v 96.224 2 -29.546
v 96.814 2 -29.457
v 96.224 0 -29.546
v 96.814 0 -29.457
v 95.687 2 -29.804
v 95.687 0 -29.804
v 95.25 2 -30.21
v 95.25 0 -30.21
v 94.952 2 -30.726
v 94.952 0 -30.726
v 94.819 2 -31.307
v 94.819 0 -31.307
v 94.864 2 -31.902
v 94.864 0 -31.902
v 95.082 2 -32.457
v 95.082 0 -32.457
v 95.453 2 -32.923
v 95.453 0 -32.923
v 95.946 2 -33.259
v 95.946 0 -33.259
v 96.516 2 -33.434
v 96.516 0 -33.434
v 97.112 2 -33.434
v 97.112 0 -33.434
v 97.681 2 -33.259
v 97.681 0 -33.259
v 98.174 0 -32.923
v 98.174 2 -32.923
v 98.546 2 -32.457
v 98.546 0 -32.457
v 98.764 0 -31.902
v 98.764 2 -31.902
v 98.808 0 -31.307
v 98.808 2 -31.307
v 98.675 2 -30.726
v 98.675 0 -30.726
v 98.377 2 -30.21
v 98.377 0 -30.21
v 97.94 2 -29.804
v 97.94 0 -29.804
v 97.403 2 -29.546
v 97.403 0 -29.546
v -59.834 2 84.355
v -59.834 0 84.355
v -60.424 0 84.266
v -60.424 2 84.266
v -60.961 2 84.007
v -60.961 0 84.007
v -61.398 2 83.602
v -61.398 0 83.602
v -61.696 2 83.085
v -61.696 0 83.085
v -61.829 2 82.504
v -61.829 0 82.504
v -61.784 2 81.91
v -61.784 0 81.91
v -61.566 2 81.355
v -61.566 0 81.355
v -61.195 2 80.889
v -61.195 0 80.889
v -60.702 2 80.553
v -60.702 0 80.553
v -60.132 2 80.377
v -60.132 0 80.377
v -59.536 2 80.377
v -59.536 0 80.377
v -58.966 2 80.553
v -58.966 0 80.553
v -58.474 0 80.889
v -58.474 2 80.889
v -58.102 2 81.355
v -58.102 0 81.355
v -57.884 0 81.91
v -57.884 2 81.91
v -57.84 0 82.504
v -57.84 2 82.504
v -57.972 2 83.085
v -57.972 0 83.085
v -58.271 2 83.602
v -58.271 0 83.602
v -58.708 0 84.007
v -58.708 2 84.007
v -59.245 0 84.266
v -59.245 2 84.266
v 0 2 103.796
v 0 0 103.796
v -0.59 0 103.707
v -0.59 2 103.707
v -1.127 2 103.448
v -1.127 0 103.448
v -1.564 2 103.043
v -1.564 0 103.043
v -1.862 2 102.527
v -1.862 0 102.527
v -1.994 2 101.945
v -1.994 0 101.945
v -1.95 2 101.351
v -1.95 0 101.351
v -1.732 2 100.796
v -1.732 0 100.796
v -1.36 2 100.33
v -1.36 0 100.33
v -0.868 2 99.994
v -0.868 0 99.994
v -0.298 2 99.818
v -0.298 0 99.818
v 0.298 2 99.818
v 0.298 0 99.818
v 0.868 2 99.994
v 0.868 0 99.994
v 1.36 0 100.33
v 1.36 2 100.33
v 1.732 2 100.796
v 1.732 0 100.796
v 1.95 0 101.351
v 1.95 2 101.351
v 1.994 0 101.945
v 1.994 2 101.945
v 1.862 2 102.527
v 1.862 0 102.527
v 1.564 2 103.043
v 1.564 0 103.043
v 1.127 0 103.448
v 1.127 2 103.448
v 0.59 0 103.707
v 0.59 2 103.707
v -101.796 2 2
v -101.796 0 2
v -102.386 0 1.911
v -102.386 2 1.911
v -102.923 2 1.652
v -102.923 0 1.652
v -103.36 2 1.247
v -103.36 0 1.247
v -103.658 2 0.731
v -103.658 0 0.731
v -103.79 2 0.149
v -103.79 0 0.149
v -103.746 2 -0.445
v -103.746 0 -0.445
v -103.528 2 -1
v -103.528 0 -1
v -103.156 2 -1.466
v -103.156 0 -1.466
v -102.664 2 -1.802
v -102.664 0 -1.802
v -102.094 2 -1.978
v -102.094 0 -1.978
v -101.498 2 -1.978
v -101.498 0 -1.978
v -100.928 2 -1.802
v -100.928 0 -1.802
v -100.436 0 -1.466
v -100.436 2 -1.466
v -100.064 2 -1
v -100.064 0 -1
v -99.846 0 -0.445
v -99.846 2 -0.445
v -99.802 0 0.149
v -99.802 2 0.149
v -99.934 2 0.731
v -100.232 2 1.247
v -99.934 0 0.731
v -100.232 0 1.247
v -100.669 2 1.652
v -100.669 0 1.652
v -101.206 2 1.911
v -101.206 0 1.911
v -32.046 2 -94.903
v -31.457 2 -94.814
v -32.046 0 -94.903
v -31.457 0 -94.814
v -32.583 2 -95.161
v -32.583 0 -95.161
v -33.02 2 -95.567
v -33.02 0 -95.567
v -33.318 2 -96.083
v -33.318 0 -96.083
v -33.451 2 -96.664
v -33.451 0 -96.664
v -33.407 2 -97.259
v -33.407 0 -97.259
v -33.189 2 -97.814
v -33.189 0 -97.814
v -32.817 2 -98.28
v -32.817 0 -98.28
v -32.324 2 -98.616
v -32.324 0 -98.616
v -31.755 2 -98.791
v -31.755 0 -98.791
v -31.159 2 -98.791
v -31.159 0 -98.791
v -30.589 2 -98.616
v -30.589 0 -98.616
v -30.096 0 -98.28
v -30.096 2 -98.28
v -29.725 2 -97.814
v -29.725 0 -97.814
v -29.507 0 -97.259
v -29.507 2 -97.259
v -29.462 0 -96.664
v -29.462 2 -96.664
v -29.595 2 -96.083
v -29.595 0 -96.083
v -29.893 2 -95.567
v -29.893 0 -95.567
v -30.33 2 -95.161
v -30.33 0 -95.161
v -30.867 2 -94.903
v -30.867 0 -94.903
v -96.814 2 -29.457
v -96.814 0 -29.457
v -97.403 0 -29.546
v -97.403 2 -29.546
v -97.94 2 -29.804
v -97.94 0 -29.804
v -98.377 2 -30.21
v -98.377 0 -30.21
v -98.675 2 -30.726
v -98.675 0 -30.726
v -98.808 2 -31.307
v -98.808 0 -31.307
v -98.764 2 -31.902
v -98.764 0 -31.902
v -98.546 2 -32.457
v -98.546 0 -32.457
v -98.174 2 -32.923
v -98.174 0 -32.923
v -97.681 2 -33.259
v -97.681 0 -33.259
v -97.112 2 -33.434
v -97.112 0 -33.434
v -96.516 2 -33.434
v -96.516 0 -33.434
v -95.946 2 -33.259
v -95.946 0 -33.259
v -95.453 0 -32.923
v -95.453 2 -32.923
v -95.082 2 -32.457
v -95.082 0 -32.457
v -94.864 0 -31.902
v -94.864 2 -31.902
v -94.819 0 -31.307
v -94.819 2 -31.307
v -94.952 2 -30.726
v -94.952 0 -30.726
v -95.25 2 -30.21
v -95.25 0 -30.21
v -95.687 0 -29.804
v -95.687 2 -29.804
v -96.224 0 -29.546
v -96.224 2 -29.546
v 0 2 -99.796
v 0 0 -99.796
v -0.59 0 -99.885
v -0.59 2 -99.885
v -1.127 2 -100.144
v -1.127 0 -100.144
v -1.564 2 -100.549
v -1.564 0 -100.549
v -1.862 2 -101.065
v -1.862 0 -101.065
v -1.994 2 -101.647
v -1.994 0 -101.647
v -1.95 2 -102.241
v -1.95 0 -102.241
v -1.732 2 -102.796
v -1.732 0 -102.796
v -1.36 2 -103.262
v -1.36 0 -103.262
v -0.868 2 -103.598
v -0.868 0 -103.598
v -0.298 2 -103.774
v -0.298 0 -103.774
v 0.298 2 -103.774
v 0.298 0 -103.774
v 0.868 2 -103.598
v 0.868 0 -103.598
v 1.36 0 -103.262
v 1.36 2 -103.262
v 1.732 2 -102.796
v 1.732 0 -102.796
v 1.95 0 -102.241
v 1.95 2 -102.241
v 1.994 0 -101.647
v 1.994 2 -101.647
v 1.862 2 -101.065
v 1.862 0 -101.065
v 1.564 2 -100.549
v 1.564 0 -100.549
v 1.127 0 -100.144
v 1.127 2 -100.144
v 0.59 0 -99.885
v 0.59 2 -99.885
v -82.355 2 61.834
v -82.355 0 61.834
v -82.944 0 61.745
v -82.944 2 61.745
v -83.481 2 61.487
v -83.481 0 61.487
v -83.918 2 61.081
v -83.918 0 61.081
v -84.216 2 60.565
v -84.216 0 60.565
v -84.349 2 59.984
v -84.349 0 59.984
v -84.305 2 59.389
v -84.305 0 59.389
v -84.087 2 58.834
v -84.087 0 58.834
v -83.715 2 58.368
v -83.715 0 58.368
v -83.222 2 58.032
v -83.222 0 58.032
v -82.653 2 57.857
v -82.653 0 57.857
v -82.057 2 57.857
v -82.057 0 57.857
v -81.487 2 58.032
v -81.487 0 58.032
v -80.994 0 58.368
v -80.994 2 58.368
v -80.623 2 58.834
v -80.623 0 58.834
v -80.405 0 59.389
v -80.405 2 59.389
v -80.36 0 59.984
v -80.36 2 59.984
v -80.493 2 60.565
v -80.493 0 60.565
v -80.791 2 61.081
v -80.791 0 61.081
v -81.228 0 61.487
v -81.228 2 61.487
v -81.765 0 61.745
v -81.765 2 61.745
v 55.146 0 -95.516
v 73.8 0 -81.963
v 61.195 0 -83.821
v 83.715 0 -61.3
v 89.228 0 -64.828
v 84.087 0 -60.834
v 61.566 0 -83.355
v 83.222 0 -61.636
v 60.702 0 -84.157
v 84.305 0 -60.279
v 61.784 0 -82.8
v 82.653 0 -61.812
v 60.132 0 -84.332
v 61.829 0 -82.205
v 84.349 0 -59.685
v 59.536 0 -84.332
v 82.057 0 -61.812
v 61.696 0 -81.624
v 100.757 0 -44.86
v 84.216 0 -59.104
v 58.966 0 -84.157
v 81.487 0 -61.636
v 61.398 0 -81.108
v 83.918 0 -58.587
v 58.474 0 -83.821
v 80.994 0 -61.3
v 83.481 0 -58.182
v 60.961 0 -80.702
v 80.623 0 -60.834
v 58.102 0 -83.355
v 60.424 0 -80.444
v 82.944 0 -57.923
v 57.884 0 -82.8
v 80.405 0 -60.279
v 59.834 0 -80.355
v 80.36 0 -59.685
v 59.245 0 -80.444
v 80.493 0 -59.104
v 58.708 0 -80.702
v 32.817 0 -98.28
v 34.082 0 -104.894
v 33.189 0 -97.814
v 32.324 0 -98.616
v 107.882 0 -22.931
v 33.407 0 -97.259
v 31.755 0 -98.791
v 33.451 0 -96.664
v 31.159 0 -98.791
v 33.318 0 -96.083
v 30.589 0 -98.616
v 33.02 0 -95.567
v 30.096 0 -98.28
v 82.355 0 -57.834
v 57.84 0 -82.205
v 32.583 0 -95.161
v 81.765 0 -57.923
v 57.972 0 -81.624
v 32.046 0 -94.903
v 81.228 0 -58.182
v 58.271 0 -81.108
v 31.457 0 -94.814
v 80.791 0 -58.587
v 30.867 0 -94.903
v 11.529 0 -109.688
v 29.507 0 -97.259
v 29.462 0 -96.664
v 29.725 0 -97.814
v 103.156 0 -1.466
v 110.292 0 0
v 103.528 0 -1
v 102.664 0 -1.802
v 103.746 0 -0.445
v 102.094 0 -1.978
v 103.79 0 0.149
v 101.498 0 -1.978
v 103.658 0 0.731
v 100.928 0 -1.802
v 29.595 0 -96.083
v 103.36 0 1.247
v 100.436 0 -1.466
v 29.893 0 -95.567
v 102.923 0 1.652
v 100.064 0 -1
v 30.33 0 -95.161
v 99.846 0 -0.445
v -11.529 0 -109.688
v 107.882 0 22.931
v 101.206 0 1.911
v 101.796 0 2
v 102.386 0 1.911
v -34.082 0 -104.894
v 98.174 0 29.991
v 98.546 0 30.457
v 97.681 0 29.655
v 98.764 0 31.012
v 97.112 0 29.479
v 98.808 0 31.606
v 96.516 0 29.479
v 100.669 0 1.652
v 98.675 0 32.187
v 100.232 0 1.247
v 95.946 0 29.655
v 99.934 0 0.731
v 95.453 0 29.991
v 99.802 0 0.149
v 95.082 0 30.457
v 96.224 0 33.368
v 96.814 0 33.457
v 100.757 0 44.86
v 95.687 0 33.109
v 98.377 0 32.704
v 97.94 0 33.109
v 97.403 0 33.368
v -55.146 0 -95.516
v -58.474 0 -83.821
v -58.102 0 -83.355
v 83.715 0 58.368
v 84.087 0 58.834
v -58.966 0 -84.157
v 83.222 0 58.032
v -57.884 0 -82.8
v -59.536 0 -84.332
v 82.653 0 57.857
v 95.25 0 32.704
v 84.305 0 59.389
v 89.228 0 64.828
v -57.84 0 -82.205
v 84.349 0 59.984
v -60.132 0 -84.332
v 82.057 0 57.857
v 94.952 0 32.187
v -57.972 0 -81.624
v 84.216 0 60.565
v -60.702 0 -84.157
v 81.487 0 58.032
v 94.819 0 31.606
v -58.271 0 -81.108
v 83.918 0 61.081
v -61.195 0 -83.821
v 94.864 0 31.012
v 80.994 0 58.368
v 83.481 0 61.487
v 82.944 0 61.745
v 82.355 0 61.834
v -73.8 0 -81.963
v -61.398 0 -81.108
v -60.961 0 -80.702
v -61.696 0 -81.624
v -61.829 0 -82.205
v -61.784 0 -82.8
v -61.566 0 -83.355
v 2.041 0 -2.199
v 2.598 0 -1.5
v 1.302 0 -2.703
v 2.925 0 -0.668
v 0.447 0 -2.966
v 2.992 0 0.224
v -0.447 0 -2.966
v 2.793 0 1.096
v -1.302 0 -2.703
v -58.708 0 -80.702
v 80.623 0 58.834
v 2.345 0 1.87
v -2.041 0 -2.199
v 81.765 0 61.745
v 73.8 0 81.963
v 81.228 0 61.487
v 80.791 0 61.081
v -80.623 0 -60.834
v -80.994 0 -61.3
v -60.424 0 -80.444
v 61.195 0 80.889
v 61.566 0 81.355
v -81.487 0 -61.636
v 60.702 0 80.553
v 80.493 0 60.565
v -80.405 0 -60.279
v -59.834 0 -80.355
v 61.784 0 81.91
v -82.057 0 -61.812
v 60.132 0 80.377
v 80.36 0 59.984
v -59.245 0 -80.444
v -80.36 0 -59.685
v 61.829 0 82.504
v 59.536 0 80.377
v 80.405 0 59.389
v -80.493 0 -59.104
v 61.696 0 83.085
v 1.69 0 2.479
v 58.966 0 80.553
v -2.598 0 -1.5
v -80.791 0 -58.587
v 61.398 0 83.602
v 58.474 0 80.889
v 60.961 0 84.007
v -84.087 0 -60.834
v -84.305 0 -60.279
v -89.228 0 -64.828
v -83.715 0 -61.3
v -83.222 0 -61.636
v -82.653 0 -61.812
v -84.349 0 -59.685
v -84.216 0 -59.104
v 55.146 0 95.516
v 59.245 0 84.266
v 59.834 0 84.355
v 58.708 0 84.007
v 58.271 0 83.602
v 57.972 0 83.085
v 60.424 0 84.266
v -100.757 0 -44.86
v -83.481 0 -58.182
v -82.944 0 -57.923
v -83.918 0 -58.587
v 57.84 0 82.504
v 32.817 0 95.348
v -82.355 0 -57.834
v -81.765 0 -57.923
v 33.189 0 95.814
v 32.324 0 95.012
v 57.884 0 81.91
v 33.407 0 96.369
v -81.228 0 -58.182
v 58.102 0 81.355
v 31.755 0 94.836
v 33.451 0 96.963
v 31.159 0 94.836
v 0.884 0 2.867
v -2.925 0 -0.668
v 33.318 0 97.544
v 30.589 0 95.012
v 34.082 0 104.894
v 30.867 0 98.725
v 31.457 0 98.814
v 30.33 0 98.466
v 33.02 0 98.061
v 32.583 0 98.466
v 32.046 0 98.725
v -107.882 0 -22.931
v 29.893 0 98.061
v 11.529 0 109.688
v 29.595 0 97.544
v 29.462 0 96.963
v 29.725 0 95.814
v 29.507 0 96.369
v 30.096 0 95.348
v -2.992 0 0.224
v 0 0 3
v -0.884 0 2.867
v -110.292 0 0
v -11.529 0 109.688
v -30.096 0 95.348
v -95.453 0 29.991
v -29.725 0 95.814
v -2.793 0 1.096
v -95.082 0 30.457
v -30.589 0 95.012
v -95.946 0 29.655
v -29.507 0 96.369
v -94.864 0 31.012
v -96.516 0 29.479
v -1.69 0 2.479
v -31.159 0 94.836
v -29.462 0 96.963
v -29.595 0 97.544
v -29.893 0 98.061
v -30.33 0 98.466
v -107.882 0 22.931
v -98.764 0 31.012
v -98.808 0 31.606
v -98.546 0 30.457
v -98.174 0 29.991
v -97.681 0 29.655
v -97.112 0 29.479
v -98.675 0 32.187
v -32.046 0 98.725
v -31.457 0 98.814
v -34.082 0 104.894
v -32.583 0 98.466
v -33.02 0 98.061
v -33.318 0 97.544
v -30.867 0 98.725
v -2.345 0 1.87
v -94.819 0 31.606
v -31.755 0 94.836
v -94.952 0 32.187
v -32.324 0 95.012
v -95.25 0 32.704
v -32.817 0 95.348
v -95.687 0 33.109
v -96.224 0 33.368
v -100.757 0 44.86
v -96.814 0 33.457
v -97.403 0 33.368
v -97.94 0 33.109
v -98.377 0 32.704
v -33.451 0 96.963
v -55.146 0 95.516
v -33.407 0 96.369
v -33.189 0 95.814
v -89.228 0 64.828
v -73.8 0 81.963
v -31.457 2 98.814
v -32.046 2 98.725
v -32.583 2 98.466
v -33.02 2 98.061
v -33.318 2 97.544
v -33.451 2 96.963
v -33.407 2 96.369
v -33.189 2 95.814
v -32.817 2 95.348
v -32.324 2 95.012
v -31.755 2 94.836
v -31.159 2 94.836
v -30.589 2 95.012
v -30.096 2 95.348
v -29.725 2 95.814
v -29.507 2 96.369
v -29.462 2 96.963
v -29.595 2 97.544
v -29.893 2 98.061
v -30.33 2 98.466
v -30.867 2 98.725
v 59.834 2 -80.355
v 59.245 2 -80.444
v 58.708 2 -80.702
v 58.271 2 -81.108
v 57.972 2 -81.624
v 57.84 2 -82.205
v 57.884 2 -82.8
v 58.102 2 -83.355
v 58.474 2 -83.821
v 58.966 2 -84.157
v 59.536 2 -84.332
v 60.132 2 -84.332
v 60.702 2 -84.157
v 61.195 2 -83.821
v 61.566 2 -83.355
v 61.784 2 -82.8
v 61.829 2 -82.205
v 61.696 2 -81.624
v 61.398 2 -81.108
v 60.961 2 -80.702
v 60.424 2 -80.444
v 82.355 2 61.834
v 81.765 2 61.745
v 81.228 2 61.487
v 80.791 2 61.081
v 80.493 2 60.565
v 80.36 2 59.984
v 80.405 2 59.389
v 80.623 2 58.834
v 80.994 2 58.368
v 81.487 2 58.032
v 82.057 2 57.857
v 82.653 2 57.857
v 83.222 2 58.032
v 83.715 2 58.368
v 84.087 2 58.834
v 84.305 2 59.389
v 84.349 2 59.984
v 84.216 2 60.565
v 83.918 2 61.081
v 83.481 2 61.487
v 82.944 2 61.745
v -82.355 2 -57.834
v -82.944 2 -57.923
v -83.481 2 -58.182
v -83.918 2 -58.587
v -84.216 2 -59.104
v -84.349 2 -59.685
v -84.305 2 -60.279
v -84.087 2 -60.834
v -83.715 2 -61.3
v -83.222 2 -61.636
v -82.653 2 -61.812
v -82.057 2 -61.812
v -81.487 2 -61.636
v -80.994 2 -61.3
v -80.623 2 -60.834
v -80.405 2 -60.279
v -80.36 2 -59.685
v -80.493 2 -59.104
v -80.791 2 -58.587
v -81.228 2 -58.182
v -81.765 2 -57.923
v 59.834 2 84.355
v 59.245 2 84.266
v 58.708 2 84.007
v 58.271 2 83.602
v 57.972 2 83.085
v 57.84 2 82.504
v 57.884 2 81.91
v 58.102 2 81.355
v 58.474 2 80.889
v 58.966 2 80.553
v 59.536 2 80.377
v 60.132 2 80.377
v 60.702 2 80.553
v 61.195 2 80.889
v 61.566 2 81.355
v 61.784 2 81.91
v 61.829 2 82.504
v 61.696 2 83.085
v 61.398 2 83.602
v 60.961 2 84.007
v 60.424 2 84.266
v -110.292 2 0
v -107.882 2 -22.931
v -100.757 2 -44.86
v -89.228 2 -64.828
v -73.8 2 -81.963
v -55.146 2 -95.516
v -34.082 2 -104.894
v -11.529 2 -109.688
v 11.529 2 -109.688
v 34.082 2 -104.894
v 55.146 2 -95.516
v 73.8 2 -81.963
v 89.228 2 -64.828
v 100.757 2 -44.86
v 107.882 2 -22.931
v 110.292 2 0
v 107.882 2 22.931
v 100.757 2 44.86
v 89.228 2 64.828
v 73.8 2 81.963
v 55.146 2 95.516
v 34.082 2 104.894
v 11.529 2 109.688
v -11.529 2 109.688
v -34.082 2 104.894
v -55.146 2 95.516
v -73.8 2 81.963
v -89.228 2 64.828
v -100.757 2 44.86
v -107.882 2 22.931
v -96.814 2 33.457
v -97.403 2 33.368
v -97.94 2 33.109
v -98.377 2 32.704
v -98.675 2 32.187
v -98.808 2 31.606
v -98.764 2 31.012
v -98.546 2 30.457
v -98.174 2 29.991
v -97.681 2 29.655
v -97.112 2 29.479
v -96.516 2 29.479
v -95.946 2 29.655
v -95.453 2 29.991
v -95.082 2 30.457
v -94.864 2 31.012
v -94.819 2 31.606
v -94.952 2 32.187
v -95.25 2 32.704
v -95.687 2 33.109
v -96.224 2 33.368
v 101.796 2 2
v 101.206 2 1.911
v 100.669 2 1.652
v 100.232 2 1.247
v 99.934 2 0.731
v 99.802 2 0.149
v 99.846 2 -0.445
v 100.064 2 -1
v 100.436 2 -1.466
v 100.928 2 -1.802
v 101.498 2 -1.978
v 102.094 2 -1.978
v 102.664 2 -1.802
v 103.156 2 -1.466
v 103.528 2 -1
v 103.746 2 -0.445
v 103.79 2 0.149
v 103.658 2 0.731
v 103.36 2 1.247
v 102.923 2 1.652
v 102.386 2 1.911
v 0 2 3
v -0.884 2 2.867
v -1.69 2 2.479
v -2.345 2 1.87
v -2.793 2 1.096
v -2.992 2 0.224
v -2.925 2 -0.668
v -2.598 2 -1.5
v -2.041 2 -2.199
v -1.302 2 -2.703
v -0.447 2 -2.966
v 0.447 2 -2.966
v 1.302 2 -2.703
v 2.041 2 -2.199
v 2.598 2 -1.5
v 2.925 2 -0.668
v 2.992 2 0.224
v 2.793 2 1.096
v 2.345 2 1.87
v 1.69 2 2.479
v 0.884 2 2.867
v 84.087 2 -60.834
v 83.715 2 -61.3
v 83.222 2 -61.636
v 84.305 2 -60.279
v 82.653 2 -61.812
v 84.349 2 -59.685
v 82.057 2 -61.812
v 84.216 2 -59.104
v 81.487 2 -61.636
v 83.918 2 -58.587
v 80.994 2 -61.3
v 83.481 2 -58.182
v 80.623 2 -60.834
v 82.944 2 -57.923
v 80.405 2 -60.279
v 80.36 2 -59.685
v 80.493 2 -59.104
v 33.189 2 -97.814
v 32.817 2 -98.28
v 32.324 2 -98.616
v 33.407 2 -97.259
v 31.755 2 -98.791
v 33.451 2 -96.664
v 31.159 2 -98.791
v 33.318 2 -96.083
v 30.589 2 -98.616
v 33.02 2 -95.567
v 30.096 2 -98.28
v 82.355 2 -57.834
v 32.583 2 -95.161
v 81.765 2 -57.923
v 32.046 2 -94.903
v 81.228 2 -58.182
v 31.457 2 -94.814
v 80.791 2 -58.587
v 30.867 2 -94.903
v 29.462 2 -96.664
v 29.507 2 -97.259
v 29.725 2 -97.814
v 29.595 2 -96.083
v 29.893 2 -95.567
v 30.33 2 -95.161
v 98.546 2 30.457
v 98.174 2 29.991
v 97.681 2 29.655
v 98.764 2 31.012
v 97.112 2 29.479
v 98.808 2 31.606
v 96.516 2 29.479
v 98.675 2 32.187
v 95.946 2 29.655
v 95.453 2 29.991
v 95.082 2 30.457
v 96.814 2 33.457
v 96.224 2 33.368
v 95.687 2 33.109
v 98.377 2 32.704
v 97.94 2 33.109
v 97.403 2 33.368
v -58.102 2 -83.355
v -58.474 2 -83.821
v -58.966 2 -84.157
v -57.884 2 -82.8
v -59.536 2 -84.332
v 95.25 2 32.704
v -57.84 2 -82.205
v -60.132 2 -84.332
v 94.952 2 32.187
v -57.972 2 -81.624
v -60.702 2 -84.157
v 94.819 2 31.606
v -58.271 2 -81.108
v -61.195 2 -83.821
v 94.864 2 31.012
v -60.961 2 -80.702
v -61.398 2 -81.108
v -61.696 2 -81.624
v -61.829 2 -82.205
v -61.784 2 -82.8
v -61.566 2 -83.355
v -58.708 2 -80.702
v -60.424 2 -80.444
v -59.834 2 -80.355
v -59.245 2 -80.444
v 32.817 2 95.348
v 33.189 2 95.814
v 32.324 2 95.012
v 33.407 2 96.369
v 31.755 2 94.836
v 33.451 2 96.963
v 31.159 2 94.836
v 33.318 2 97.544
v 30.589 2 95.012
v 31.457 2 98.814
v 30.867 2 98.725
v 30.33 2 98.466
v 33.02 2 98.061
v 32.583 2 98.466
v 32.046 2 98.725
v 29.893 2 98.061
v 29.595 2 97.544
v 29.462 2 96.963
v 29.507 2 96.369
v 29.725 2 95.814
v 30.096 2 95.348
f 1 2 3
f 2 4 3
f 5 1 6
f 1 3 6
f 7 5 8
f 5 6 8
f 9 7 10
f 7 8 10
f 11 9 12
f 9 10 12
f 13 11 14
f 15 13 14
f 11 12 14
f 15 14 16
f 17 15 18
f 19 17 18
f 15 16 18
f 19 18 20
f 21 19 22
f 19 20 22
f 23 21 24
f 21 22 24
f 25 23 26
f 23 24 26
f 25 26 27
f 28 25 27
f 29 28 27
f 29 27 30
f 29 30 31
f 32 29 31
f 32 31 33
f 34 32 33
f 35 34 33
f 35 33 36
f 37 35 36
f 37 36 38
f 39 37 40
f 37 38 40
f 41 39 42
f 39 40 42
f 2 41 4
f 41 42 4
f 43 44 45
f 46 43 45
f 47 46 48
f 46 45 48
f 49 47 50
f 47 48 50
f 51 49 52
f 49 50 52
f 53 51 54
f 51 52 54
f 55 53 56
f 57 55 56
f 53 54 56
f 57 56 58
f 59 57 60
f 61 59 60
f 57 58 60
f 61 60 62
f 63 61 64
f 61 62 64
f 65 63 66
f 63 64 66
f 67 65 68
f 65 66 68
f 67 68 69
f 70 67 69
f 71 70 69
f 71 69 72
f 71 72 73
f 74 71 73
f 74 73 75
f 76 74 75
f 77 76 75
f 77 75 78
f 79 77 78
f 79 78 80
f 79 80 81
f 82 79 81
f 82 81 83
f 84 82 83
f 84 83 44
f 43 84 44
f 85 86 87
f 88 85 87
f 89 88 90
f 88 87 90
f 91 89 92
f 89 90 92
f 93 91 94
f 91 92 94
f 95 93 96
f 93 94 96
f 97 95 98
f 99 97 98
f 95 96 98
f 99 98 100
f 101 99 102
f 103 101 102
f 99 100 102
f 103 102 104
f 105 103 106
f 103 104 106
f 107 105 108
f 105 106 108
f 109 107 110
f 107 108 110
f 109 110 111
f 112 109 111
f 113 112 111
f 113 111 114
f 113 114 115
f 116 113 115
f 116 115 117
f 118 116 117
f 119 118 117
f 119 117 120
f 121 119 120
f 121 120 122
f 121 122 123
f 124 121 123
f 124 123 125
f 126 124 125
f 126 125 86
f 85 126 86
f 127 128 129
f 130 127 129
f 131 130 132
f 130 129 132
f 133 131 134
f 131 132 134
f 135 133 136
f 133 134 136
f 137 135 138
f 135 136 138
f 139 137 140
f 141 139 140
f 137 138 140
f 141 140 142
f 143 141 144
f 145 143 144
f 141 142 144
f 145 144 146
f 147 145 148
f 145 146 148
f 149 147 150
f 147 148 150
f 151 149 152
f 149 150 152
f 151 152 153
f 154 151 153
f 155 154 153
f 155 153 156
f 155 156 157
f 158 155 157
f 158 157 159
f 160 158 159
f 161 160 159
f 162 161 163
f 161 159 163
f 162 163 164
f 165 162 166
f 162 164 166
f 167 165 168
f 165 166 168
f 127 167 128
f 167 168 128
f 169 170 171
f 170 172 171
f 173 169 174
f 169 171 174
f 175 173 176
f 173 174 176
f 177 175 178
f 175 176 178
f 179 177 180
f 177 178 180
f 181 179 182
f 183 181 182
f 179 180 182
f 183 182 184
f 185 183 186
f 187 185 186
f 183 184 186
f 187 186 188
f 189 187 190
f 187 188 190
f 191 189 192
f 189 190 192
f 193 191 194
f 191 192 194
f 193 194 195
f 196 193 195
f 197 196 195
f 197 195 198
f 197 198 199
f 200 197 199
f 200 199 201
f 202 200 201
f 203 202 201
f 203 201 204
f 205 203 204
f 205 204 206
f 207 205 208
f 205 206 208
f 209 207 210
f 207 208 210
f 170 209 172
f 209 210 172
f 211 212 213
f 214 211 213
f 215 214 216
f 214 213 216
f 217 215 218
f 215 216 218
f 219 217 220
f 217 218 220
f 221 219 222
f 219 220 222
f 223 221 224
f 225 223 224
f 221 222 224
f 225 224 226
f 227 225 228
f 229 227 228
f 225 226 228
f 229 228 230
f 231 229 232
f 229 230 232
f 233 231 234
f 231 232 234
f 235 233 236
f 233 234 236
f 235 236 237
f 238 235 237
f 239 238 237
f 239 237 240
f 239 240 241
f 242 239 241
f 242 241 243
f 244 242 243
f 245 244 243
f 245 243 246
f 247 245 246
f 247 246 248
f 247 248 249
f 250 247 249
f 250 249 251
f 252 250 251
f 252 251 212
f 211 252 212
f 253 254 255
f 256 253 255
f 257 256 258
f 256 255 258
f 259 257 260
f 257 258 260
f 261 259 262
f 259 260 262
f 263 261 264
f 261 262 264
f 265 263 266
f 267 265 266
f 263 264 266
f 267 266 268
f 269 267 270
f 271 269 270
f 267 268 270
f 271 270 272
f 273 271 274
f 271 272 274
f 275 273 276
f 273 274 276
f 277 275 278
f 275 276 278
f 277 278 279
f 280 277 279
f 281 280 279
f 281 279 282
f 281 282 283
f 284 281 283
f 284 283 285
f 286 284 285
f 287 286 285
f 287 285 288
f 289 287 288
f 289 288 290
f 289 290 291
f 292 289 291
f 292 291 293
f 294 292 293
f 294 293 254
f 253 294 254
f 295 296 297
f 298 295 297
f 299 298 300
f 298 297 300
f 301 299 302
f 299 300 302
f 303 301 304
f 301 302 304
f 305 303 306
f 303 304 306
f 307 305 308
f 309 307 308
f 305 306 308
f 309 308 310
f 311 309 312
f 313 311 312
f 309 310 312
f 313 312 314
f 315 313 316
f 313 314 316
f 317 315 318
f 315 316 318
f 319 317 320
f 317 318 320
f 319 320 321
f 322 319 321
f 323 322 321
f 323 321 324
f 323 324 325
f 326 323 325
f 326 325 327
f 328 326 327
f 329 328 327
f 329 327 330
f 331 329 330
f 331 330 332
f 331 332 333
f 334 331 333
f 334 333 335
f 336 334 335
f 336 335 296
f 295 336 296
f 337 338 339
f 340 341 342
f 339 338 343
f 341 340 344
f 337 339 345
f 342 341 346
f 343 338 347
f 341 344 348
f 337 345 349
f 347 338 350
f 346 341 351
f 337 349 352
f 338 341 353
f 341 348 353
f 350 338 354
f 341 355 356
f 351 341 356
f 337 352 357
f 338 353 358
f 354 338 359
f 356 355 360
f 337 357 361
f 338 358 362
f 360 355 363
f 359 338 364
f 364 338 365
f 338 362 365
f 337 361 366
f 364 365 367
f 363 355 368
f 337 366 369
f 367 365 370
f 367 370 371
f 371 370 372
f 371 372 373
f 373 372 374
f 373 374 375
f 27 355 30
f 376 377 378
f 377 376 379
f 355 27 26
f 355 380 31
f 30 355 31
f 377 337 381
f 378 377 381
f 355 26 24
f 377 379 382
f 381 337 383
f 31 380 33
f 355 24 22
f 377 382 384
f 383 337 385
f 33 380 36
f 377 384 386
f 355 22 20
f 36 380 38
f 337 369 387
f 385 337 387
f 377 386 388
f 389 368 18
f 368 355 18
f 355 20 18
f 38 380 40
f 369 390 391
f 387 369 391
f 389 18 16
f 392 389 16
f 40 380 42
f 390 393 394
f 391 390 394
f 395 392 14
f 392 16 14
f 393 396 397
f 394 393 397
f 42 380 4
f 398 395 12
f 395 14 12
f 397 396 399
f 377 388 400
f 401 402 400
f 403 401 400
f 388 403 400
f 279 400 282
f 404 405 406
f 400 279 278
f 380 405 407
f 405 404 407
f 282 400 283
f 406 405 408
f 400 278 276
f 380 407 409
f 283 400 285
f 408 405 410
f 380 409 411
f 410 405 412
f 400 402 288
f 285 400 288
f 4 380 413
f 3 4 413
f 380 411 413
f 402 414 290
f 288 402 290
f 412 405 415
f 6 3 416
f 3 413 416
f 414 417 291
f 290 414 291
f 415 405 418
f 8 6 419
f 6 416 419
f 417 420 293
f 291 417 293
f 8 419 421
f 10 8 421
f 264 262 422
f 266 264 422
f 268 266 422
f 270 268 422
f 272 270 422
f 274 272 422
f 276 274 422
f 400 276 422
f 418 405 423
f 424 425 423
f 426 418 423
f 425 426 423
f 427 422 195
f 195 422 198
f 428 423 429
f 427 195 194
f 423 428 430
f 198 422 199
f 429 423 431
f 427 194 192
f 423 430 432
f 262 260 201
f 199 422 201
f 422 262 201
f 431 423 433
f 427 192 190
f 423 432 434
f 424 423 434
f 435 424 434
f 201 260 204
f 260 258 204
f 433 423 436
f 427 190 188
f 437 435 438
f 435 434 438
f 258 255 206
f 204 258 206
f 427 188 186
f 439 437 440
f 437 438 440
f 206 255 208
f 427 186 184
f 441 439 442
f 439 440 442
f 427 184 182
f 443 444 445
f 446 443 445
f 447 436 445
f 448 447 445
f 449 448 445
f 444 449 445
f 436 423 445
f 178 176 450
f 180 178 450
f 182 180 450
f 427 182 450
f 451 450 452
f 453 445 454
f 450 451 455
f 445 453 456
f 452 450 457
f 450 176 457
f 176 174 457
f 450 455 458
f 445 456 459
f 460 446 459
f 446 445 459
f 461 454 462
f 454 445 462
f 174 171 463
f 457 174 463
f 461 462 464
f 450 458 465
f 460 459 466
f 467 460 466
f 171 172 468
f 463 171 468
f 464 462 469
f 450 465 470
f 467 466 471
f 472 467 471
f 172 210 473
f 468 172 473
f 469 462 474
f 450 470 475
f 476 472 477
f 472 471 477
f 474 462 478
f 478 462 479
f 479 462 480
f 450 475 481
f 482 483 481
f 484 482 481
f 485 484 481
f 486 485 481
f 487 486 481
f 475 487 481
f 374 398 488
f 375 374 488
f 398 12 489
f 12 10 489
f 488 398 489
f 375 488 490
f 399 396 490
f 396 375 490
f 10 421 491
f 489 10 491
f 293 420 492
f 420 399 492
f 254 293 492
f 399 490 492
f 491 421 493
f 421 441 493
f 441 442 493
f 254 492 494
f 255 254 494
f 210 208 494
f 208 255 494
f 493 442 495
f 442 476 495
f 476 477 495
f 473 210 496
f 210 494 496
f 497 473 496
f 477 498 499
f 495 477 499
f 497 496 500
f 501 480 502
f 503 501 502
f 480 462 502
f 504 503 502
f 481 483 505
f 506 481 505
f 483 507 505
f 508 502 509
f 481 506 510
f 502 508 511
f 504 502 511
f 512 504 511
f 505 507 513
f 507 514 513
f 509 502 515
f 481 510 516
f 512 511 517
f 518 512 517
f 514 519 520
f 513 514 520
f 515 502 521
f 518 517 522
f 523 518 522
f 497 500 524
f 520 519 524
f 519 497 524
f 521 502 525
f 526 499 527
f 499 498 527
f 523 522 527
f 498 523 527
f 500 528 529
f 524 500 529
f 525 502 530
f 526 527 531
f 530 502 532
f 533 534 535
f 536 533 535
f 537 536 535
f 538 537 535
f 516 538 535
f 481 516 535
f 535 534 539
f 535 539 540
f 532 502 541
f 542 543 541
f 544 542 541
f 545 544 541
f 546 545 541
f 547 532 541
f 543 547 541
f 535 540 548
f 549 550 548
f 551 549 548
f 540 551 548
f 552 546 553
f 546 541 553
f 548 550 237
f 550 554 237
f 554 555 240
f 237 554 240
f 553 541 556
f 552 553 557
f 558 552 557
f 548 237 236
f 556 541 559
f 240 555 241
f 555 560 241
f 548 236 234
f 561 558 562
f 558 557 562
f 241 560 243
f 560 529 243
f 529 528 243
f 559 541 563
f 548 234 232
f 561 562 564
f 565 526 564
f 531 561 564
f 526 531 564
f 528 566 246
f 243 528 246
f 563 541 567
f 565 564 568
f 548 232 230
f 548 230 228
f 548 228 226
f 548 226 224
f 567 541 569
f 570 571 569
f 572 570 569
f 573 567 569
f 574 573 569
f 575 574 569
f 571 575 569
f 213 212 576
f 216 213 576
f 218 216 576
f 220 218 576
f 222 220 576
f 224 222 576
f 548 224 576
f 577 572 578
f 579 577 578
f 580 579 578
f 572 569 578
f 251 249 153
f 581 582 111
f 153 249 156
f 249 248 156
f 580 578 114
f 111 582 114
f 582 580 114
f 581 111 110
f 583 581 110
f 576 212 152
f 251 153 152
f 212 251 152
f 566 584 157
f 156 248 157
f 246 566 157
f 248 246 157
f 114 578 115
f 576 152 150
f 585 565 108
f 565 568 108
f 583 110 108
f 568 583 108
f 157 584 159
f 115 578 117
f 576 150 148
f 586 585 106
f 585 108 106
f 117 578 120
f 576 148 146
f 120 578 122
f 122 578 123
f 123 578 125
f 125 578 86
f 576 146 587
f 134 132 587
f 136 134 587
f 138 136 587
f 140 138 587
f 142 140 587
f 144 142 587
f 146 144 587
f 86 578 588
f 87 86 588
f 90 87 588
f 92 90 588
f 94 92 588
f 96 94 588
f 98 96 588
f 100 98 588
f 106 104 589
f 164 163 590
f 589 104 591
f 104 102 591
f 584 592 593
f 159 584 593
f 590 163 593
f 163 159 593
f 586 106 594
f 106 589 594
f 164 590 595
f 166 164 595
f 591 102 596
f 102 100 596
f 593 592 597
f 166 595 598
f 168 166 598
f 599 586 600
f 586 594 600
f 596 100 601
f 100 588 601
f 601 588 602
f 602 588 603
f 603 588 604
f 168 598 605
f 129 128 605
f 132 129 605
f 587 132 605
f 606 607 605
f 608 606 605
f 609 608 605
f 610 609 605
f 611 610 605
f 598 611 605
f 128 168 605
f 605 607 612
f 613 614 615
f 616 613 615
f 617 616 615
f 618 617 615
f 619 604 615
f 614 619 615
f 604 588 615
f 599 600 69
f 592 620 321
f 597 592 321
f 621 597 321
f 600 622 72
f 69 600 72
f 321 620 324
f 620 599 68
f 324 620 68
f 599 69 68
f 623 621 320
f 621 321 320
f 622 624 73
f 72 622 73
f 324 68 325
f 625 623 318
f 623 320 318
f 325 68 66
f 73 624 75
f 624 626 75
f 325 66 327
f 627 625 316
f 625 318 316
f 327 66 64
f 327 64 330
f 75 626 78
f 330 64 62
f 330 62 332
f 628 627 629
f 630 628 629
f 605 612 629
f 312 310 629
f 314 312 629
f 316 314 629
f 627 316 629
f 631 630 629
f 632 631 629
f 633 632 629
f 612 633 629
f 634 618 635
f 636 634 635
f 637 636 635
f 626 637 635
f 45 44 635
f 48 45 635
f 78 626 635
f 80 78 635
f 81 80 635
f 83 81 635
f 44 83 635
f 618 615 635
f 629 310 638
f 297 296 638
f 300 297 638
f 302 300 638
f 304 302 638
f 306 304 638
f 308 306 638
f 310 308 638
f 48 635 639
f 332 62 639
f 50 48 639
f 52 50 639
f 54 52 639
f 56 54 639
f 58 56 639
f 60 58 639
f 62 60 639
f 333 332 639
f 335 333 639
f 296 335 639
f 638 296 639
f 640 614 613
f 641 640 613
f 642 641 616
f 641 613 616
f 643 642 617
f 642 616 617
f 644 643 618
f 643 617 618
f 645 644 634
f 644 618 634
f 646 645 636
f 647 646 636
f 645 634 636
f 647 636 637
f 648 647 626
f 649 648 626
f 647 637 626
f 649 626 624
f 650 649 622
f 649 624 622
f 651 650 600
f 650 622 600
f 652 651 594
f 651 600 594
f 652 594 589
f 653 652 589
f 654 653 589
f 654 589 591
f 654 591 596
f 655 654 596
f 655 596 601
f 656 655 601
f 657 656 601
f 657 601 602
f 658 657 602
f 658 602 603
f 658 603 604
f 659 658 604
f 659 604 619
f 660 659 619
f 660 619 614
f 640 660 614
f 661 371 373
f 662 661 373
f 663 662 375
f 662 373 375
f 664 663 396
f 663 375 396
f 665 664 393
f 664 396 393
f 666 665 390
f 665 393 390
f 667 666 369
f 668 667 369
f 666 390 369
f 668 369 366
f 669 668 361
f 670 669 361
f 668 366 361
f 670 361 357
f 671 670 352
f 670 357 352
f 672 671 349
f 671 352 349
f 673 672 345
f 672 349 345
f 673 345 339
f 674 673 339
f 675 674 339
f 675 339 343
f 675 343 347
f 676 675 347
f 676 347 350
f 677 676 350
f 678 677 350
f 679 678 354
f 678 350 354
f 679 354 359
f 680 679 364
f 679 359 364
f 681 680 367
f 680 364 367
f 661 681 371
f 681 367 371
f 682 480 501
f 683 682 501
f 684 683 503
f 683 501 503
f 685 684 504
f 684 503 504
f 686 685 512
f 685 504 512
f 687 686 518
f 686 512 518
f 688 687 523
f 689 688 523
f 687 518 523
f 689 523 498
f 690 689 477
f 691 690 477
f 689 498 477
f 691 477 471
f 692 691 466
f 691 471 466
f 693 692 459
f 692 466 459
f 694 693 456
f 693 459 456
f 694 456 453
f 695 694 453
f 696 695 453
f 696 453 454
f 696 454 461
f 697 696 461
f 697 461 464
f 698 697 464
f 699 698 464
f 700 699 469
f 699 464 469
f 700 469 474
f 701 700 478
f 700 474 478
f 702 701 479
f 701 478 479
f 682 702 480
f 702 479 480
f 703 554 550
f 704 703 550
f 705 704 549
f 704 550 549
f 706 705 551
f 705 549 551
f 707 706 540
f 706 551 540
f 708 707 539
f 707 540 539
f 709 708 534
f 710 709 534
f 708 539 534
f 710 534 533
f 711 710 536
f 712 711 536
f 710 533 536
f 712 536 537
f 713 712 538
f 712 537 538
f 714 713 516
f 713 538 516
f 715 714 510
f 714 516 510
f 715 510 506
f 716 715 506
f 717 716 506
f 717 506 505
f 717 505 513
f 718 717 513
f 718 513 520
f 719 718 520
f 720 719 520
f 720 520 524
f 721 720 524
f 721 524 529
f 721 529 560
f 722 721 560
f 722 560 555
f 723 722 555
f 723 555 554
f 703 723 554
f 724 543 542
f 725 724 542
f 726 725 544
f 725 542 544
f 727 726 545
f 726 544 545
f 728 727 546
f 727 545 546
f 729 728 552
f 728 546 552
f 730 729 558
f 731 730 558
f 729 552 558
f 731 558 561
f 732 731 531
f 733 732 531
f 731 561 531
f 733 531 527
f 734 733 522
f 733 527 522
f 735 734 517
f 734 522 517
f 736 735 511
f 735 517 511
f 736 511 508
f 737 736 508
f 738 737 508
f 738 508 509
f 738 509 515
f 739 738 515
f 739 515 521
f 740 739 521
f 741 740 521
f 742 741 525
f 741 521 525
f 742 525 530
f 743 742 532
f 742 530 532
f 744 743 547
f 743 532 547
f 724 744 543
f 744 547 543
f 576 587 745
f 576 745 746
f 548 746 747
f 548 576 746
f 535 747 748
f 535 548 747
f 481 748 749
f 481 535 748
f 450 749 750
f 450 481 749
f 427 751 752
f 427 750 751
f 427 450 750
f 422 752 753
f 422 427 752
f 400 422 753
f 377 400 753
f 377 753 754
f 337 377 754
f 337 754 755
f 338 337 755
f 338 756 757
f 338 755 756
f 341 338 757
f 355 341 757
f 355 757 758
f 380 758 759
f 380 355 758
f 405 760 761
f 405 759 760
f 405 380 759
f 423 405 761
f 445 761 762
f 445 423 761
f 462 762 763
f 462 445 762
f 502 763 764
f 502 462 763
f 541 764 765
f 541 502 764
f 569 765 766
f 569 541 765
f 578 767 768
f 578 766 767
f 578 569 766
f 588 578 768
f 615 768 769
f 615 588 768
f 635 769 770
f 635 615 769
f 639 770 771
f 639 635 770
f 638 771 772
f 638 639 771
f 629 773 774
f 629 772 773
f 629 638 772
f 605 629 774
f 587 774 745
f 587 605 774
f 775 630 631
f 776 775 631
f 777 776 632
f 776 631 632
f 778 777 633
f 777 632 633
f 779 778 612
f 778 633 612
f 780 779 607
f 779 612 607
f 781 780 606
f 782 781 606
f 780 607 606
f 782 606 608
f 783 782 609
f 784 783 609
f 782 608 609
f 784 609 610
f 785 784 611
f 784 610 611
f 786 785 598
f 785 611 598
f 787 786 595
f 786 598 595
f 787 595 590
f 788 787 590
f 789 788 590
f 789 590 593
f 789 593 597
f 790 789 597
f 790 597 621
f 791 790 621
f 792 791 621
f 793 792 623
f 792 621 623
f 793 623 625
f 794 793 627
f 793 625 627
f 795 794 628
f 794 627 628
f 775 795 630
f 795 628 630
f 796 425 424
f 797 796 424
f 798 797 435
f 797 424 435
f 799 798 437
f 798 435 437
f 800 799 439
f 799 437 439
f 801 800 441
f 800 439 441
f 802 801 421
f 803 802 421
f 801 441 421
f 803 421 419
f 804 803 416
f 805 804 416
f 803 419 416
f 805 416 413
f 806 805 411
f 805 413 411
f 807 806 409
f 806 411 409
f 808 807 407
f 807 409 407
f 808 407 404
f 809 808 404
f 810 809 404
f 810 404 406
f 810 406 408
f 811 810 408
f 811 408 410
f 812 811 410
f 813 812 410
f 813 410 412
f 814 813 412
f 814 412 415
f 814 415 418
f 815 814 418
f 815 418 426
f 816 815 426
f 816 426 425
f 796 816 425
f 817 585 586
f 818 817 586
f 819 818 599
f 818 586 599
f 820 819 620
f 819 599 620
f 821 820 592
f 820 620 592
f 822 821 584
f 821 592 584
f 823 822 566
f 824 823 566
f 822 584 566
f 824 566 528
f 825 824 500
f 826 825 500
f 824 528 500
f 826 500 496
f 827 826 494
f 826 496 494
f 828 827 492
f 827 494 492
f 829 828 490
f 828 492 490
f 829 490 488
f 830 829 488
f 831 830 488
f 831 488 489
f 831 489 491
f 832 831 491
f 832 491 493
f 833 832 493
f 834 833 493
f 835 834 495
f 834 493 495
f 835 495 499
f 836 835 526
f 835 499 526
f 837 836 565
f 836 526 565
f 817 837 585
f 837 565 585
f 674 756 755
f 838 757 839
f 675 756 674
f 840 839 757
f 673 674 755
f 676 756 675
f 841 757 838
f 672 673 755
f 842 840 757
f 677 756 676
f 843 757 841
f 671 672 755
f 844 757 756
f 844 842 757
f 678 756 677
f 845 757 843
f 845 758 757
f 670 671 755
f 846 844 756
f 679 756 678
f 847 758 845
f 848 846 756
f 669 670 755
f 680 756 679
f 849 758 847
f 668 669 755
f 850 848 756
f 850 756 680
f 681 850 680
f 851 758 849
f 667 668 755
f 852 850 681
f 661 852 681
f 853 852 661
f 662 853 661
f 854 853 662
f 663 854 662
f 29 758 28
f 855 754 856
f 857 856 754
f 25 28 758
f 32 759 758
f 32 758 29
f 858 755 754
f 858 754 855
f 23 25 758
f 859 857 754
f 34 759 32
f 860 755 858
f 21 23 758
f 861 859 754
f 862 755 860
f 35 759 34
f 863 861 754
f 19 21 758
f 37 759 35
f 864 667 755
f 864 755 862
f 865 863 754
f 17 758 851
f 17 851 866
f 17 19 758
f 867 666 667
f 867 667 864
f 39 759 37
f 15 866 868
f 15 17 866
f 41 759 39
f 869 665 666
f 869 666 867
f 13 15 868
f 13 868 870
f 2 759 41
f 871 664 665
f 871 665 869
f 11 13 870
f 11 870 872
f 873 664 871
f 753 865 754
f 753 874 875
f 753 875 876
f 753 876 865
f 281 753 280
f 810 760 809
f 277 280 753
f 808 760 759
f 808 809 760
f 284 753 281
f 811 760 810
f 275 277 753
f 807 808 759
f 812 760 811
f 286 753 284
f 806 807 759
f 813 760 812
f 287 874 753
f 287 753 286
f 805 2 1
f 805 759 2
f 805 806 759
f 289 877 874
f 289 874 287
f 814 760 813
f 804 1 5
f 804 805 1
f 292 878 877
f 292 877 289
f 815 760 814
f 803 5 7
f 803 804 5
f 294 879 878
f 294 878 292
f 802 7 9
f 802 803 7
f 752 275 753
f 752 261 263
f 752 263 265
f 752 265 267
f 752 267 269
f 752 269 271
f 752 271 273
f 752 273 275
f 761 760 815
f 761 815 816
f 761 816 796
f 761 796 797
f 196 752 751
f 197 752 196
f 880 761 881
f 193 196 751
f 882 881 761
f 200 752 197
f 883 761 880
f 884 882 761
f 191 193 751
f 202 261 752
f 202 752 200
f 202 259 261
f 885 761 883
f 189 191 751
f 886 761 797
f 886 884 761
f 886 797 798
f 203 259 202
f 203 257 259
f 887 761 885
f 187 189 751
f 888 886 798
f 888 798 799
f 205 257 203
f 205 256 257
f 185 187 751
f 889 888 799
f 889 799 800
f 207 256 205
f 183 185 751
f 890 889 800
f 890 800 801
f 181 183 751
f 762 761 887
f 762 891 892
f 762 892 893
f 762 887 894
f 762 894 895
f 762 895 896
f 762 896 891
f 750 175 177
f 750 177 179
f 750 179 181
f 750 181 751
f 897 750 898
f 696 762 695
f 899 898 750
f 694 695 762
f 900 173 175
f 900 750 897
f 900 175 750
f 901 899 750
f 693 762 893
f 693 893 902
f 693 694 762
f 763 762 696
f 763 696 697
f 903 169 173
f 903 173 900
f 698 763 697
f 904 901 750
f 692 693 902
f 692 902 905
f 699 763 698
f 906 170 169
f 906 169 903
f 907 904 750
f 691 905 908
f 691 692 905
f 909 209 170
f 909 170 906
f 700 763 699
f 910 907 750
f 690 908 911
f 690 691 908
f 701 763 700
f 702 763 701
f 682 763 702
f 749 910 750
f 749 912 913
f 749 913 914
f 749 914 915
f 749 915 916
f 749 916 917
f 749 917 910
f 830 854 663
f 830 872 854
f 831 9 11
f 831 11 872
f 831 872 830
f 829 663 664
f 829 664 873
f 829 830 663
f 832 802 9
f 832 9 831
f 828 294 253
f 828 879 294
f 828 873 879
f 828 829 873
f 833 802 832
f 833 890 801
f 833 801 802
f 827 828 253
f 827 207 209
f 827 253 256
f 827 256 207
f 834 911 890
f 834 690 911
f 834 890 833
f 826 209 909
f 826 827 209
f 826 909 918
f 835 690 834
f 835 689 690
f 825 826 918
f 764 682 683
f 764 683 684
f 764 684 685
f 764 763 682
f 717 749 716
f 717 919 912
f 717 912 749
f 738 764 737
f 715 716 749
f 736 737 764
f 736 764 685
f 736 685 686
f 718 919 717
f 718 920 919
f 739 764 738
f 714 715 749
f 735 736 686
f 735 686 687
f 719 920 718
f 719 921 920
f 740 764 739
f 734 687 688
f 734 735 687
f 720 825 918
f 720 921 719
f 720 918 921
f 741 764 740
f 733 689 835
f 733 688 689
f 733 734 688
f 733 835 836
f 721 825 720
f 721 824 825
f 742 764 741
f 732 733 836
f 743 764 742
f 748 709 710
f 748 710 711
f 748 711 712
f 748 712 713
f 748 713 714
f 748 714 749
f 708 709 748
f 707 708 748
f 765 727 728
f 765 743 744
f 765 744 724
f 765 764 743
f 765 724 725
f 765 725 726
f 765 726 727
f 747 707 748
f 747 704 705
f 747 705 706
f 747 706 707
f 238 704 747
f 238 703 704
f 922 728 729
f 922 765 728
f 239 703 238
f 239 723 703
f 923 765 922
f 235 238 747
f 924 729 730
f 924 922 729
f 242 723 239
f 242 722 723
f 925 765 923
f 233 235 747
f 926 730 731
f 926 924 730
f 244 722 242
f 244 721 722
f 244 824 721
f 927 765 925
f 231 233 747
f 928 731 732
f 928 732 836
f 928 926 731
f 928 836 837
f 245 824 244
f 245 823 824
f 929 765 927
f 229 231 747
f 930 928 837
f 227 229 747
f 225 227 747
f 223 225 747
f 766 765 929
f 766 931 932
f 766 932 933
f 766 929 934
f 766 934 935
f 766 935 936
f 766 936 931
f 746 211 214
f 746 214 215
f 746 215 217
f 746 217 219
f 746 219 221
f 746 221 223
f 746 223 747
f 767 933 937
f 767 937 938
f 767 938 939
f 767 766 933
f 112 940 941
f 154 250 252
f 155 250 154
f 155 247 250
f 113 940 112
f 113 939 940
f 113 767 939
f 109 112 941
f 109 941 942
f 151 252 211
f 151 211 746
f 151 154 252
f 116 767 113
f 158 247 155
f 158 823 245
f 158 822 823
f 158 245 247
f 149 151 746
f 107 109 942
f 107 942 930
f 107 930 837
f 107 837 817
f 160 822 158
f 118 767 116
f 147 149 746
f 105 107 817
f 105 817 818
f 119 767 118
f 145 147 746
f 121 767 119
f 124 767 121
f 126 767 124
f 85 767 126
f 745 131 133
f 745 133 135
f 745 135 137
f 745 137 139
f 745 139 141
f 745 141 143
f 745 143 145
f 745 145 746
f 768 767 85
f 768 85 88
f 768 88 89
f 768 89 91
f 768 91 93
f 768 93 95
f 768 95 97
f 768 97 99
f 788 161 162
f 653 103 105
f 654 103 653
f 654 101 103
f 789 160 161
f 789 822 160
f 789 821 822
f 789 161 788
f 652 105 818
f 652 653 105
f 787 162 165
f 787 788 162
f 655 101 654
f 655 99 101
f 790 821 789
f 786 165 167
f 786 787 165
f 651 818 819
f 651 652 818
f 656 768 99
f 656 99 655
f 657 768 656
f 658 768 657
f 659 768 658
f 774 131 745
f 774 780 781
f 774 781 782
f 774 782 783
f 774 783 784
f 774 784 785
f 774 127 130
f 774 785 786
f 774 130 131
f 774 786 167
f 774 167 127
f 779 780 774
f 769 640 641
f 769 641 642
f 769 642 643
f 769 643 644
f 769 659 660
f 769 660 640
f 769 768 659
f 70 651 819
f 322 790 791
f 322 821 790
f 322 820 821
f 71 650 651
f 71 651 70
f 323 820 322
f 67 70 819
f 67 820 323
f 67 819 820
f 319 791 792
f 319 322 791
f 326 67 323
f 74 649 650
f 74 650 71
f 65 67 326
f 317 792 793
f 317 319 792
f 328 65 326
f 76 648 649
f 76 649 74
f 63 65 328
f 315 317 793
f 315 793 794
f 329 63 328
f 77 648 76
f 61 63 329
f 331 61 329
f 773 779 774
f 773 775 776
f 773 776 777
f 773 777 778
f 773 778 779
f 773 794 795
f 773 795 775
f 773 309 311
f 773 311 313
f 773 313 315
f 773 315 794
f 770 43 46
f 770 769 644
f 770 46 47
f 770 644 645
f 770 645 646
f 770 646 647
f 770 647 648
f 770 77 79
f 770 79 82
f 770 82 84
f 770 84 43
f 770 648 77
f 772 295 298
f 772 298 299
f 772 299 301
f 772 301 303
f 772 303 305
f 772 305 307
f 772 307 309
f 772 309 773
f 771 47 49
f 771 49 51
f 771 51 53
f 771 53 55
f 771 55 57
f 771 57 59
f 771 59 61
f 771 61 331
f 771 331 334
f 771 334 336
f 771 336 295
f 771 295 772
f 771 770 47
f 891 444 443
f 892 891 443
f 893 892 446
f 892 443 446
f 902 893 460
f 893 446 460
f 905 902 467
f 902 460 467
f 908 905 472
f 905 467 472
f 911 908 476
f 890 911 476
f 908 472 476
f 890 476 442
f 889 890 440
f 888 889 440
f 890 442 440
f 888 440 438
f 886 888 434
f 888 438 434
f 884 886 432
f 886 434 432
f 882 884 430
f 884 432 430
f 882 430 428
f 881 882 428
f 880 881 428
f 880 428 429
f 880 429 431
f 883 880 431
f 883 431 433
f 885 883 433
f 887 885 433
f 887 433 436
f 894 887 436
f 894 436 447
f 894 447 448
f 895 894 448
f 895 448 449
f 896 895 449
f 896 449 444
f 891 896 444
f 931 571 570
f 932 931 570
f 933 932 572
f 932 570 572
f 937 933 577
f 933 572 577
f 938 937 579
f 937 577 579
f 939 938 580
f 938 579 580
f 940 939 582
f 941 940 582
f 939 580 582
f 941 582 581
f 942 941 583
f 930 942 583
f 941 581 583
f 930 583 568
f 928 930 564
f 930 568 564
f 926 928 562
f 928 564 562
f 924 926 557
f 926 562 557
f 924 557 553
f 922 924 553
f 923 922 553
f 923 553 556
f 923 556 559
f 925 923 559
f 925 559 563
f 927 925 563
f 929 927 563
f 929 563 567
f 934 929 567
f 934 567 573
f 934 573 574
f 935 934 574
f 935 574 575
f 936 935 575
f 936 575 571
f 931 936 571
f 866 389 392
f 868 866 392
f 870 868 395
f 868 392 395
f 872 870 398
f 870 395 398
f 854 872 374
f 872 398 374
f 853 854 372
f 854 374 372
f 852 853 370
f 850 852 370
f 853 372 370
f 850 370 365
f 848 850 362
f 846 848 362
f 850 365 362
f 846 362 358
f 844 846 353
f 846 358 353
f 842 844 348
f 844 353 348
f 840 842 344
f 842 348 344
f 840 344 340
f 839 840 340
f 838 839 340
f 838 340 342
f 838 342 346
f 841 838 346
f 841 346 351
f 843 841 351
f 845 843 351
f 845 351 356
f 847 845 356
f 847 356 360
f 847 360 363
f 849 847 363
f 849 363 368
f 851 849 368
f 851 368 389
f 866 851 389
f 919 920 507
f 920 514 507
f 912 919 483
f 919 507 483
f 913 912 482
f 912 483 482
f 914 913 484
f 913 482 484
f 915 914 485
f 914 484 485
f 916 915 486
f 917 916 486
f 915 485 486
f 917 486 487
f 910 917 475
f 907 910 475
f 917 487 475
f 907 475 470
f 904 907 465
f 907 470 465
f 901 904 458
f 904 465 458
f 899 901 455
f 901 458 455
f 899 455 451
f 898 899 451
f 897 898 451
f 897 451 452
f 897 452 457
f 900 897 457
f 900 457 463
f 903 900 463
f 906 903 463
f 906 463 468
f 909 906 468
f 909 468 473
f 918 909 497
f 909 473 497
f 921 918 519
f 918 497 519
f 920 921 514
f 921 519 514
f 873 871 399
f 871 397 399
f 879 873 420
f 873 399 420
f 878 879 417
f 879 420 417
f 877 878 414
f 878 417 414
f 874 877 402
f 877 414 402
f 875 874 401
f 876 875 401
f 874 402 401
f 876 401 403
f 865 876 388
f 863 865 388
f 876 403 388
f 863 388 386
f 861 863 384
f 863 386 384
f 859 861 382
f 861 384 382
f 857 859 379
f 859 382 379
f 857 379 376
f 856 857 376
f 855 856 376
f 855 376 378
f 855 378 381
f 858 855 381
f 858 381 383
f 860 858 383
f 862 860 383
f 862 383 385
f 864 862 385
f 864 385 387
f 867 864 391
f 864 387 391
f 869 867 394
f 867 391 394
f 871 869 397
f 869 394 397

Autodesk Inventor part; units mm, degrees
ref_plane "YZ Plane" through (0, 0, 0) normal (1, 0, 0) x (0, 1, 0)
ref_plane "XZ Plane" through (0, 0, 0) normal (0, 1, 0) x (-1, 0, 0)
ref_plane "XY Plane" through (0, 0, 0) normal (0, 0, 1) x (1, 0, 0)
sketch "Sketch1" plane through (0, 0, 0) normal (0, 1, 0) x (-1, 0, 0)
  circle A0 centre (0, 0) radius 110.292
  dimension "d0" = 220.584
extrude "Extrusion1" add sketch "Sketch1" along normal blind 2
sketch "Sketch2" plane through (0, 2, 0) normal (0, 1, 0) x (1, 0, 0)
  line L0 (0, 0) -> (0, 101.796)
  circle A0 centre (0, 101.796) radius 2
  circle A1 centre (-31.4567, 96.8137) radius 2
  circle A2 centre (-59.8342, 82.3547) radius 2
  circle A3 centre (-82.3547, 59.8342) radius 2
  circle A4 centre (-96.8137, 31.4567) radius 2
  circle A5 centre (-101.796, 0) radius 2
  circle A6 centre (-96.8137, -31.4567) radius 2
  circle A7 centre (-82.3547, -59.8342) radius 2
  circle A8 centre (-59.8342, -82.3547) radius 2
  circle A9 centre (-31.4567, -96.8137) radius 2
  circle A10 centre (0, -101.796) radius 2
  circle A11 centre (31.4567, -96.8137) radius 2
  circle A12 centre (59.8342, -82.3547) radius 2
  circle A13 centre (82.3547, -59.8342) radius 2
  circle A14 centre (96.8137, -31.4567) radius 2
  circle A15 centre (101.796, 0) radius 2
  circle A16 centre (96.8137, 31.4567) radius 2
  circle A17 centre (82.3547, 59.8342) radius 2
  circle A18 centre (59.8342, 82.3547) radius 2
  circle A19 centre (31.4567, 96.8137) radius 2
  dimension "d3" = 101.796
  dimension "d4" = 4
  dimension "d7" = 360
hole "Hole1" at (-96.8137, 2, -31.4567) at (-82.3547, 2, -59.8342) at (-59.8342, 2, -82.3547) at (-31.4567, 2, -96.8137) at (31.4567, 2, -96.8137) at (59.8342, 2, -82.3547) at (82.3547, 2, -59.8342) at (96.8137, 2, -31.4567) at (101.796, 2, 0) at (96.8137, 2, 31.4567) at (82.3547, 2, 59.8342) at (59.8342, 2, 82.3547) at (31.4567, 2, 96.8137) at (0, 2, 101.796) at (-31.4567, 2, 96.8137) at (-59.8342, 2, 82.3547) at (-82.3547, 2, 59.8342) at (-96.8137, 2, 31.4567) at (-101.796, 2, 0) at (0, 2, -101.796) direction (0, -1, 0) diameter 4 end through all
sketch "Sketch4" plane through (0, 2, 0) normal (0, 1, 0) x (1, 0, 0)
  point P0 (0, 0)
  point P1 (0, 0)
hole "Hole2" at (0, 2, 0) direction (0, -1, 0) diameter 6 end through all
properties part number "baseplate_azimuth_gear" material "Aluminum 6061"
